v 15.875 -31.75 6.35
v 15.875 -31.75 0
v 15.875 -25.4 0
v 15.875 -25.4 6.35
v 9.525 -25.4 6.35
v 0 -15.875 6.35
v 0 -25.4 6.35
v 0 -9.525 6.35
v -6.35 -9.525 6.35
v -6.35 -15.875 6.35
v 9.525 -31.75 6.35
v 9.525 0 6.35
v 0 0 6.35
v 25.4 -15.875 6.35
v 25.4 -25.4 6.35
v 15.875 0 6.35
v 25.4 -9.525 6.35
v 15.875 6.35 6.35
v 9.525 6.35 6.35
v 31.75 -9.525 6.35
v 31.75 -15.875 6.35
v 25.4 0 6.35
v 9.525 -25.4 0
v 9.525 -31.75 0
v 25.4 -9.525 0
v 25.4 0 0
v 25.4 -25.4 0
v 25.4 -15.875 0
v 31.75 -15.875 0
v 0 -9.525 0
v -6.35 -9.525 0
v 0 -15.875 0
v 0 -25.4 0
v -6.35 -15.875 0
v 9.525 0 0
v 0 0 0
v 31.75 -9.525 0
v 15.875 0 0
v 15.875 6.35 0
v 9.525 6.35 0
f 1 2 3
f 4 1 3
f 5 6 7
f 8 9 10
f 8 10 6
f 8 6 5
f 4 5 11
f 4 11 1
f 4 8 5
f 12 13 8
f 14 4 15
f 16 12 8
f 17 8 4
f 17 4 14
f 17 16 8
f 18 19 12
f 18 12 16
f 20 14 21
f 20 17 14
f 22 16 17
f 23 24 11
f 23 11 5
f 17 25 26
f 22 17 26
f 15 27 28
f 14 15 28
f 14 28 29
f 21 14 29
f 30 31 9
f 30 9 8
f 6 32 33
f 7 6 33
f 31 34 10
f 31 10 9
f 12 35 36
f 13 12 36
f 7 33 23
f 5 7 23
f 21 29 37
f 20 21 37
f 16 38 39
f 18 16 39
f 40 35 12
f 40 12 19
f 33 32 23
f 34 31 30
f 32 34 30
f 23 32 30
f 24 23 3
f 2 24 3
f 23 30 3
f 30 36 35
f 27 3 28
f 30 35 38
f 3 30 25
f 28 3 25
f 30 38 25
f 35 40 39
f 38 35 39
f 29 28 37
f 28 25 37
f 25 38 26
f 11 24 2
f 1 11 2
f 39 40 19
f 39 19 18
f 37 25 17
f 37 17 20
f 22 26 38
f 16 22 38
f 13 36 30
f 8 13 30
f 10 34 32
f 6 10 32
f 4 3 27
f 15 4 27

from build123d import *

# Parameters (mm, degrees)
F0_W     = 6.35
F0_H     = 6.35
F1_DEPTH = 6.35


with BuildPart() as f1:
    # F0 (on Top) → F1 (new body)
    with BuildSketch(Plane.XY):
        Polygon((9.525, 0), (0, 0), (0, -9.525), (0, -15.875), (0, -25.4), (9.525, -25.4), (15.875, -25.4), (25.4, -25.4), (25.4, -15.875), (25.4, -9.525), (25.4, 0), (15.875, 0), align=None)
        with Locations((12.7, 3.175)):
            Rectangle(F0_W, F0_H)
        with Locations((-3.175, -12.7)):
            Rectangle(F0_W, F0_H)
        with Locations((28.575, -12.7)):
            Rectangle(F0_W, F0_H)
        with Locations((12.7, -28.575)):
            Rectangle(F0_W, F0_H)
    extrude(amount=F1_DEPTH)


solid = f1.part
